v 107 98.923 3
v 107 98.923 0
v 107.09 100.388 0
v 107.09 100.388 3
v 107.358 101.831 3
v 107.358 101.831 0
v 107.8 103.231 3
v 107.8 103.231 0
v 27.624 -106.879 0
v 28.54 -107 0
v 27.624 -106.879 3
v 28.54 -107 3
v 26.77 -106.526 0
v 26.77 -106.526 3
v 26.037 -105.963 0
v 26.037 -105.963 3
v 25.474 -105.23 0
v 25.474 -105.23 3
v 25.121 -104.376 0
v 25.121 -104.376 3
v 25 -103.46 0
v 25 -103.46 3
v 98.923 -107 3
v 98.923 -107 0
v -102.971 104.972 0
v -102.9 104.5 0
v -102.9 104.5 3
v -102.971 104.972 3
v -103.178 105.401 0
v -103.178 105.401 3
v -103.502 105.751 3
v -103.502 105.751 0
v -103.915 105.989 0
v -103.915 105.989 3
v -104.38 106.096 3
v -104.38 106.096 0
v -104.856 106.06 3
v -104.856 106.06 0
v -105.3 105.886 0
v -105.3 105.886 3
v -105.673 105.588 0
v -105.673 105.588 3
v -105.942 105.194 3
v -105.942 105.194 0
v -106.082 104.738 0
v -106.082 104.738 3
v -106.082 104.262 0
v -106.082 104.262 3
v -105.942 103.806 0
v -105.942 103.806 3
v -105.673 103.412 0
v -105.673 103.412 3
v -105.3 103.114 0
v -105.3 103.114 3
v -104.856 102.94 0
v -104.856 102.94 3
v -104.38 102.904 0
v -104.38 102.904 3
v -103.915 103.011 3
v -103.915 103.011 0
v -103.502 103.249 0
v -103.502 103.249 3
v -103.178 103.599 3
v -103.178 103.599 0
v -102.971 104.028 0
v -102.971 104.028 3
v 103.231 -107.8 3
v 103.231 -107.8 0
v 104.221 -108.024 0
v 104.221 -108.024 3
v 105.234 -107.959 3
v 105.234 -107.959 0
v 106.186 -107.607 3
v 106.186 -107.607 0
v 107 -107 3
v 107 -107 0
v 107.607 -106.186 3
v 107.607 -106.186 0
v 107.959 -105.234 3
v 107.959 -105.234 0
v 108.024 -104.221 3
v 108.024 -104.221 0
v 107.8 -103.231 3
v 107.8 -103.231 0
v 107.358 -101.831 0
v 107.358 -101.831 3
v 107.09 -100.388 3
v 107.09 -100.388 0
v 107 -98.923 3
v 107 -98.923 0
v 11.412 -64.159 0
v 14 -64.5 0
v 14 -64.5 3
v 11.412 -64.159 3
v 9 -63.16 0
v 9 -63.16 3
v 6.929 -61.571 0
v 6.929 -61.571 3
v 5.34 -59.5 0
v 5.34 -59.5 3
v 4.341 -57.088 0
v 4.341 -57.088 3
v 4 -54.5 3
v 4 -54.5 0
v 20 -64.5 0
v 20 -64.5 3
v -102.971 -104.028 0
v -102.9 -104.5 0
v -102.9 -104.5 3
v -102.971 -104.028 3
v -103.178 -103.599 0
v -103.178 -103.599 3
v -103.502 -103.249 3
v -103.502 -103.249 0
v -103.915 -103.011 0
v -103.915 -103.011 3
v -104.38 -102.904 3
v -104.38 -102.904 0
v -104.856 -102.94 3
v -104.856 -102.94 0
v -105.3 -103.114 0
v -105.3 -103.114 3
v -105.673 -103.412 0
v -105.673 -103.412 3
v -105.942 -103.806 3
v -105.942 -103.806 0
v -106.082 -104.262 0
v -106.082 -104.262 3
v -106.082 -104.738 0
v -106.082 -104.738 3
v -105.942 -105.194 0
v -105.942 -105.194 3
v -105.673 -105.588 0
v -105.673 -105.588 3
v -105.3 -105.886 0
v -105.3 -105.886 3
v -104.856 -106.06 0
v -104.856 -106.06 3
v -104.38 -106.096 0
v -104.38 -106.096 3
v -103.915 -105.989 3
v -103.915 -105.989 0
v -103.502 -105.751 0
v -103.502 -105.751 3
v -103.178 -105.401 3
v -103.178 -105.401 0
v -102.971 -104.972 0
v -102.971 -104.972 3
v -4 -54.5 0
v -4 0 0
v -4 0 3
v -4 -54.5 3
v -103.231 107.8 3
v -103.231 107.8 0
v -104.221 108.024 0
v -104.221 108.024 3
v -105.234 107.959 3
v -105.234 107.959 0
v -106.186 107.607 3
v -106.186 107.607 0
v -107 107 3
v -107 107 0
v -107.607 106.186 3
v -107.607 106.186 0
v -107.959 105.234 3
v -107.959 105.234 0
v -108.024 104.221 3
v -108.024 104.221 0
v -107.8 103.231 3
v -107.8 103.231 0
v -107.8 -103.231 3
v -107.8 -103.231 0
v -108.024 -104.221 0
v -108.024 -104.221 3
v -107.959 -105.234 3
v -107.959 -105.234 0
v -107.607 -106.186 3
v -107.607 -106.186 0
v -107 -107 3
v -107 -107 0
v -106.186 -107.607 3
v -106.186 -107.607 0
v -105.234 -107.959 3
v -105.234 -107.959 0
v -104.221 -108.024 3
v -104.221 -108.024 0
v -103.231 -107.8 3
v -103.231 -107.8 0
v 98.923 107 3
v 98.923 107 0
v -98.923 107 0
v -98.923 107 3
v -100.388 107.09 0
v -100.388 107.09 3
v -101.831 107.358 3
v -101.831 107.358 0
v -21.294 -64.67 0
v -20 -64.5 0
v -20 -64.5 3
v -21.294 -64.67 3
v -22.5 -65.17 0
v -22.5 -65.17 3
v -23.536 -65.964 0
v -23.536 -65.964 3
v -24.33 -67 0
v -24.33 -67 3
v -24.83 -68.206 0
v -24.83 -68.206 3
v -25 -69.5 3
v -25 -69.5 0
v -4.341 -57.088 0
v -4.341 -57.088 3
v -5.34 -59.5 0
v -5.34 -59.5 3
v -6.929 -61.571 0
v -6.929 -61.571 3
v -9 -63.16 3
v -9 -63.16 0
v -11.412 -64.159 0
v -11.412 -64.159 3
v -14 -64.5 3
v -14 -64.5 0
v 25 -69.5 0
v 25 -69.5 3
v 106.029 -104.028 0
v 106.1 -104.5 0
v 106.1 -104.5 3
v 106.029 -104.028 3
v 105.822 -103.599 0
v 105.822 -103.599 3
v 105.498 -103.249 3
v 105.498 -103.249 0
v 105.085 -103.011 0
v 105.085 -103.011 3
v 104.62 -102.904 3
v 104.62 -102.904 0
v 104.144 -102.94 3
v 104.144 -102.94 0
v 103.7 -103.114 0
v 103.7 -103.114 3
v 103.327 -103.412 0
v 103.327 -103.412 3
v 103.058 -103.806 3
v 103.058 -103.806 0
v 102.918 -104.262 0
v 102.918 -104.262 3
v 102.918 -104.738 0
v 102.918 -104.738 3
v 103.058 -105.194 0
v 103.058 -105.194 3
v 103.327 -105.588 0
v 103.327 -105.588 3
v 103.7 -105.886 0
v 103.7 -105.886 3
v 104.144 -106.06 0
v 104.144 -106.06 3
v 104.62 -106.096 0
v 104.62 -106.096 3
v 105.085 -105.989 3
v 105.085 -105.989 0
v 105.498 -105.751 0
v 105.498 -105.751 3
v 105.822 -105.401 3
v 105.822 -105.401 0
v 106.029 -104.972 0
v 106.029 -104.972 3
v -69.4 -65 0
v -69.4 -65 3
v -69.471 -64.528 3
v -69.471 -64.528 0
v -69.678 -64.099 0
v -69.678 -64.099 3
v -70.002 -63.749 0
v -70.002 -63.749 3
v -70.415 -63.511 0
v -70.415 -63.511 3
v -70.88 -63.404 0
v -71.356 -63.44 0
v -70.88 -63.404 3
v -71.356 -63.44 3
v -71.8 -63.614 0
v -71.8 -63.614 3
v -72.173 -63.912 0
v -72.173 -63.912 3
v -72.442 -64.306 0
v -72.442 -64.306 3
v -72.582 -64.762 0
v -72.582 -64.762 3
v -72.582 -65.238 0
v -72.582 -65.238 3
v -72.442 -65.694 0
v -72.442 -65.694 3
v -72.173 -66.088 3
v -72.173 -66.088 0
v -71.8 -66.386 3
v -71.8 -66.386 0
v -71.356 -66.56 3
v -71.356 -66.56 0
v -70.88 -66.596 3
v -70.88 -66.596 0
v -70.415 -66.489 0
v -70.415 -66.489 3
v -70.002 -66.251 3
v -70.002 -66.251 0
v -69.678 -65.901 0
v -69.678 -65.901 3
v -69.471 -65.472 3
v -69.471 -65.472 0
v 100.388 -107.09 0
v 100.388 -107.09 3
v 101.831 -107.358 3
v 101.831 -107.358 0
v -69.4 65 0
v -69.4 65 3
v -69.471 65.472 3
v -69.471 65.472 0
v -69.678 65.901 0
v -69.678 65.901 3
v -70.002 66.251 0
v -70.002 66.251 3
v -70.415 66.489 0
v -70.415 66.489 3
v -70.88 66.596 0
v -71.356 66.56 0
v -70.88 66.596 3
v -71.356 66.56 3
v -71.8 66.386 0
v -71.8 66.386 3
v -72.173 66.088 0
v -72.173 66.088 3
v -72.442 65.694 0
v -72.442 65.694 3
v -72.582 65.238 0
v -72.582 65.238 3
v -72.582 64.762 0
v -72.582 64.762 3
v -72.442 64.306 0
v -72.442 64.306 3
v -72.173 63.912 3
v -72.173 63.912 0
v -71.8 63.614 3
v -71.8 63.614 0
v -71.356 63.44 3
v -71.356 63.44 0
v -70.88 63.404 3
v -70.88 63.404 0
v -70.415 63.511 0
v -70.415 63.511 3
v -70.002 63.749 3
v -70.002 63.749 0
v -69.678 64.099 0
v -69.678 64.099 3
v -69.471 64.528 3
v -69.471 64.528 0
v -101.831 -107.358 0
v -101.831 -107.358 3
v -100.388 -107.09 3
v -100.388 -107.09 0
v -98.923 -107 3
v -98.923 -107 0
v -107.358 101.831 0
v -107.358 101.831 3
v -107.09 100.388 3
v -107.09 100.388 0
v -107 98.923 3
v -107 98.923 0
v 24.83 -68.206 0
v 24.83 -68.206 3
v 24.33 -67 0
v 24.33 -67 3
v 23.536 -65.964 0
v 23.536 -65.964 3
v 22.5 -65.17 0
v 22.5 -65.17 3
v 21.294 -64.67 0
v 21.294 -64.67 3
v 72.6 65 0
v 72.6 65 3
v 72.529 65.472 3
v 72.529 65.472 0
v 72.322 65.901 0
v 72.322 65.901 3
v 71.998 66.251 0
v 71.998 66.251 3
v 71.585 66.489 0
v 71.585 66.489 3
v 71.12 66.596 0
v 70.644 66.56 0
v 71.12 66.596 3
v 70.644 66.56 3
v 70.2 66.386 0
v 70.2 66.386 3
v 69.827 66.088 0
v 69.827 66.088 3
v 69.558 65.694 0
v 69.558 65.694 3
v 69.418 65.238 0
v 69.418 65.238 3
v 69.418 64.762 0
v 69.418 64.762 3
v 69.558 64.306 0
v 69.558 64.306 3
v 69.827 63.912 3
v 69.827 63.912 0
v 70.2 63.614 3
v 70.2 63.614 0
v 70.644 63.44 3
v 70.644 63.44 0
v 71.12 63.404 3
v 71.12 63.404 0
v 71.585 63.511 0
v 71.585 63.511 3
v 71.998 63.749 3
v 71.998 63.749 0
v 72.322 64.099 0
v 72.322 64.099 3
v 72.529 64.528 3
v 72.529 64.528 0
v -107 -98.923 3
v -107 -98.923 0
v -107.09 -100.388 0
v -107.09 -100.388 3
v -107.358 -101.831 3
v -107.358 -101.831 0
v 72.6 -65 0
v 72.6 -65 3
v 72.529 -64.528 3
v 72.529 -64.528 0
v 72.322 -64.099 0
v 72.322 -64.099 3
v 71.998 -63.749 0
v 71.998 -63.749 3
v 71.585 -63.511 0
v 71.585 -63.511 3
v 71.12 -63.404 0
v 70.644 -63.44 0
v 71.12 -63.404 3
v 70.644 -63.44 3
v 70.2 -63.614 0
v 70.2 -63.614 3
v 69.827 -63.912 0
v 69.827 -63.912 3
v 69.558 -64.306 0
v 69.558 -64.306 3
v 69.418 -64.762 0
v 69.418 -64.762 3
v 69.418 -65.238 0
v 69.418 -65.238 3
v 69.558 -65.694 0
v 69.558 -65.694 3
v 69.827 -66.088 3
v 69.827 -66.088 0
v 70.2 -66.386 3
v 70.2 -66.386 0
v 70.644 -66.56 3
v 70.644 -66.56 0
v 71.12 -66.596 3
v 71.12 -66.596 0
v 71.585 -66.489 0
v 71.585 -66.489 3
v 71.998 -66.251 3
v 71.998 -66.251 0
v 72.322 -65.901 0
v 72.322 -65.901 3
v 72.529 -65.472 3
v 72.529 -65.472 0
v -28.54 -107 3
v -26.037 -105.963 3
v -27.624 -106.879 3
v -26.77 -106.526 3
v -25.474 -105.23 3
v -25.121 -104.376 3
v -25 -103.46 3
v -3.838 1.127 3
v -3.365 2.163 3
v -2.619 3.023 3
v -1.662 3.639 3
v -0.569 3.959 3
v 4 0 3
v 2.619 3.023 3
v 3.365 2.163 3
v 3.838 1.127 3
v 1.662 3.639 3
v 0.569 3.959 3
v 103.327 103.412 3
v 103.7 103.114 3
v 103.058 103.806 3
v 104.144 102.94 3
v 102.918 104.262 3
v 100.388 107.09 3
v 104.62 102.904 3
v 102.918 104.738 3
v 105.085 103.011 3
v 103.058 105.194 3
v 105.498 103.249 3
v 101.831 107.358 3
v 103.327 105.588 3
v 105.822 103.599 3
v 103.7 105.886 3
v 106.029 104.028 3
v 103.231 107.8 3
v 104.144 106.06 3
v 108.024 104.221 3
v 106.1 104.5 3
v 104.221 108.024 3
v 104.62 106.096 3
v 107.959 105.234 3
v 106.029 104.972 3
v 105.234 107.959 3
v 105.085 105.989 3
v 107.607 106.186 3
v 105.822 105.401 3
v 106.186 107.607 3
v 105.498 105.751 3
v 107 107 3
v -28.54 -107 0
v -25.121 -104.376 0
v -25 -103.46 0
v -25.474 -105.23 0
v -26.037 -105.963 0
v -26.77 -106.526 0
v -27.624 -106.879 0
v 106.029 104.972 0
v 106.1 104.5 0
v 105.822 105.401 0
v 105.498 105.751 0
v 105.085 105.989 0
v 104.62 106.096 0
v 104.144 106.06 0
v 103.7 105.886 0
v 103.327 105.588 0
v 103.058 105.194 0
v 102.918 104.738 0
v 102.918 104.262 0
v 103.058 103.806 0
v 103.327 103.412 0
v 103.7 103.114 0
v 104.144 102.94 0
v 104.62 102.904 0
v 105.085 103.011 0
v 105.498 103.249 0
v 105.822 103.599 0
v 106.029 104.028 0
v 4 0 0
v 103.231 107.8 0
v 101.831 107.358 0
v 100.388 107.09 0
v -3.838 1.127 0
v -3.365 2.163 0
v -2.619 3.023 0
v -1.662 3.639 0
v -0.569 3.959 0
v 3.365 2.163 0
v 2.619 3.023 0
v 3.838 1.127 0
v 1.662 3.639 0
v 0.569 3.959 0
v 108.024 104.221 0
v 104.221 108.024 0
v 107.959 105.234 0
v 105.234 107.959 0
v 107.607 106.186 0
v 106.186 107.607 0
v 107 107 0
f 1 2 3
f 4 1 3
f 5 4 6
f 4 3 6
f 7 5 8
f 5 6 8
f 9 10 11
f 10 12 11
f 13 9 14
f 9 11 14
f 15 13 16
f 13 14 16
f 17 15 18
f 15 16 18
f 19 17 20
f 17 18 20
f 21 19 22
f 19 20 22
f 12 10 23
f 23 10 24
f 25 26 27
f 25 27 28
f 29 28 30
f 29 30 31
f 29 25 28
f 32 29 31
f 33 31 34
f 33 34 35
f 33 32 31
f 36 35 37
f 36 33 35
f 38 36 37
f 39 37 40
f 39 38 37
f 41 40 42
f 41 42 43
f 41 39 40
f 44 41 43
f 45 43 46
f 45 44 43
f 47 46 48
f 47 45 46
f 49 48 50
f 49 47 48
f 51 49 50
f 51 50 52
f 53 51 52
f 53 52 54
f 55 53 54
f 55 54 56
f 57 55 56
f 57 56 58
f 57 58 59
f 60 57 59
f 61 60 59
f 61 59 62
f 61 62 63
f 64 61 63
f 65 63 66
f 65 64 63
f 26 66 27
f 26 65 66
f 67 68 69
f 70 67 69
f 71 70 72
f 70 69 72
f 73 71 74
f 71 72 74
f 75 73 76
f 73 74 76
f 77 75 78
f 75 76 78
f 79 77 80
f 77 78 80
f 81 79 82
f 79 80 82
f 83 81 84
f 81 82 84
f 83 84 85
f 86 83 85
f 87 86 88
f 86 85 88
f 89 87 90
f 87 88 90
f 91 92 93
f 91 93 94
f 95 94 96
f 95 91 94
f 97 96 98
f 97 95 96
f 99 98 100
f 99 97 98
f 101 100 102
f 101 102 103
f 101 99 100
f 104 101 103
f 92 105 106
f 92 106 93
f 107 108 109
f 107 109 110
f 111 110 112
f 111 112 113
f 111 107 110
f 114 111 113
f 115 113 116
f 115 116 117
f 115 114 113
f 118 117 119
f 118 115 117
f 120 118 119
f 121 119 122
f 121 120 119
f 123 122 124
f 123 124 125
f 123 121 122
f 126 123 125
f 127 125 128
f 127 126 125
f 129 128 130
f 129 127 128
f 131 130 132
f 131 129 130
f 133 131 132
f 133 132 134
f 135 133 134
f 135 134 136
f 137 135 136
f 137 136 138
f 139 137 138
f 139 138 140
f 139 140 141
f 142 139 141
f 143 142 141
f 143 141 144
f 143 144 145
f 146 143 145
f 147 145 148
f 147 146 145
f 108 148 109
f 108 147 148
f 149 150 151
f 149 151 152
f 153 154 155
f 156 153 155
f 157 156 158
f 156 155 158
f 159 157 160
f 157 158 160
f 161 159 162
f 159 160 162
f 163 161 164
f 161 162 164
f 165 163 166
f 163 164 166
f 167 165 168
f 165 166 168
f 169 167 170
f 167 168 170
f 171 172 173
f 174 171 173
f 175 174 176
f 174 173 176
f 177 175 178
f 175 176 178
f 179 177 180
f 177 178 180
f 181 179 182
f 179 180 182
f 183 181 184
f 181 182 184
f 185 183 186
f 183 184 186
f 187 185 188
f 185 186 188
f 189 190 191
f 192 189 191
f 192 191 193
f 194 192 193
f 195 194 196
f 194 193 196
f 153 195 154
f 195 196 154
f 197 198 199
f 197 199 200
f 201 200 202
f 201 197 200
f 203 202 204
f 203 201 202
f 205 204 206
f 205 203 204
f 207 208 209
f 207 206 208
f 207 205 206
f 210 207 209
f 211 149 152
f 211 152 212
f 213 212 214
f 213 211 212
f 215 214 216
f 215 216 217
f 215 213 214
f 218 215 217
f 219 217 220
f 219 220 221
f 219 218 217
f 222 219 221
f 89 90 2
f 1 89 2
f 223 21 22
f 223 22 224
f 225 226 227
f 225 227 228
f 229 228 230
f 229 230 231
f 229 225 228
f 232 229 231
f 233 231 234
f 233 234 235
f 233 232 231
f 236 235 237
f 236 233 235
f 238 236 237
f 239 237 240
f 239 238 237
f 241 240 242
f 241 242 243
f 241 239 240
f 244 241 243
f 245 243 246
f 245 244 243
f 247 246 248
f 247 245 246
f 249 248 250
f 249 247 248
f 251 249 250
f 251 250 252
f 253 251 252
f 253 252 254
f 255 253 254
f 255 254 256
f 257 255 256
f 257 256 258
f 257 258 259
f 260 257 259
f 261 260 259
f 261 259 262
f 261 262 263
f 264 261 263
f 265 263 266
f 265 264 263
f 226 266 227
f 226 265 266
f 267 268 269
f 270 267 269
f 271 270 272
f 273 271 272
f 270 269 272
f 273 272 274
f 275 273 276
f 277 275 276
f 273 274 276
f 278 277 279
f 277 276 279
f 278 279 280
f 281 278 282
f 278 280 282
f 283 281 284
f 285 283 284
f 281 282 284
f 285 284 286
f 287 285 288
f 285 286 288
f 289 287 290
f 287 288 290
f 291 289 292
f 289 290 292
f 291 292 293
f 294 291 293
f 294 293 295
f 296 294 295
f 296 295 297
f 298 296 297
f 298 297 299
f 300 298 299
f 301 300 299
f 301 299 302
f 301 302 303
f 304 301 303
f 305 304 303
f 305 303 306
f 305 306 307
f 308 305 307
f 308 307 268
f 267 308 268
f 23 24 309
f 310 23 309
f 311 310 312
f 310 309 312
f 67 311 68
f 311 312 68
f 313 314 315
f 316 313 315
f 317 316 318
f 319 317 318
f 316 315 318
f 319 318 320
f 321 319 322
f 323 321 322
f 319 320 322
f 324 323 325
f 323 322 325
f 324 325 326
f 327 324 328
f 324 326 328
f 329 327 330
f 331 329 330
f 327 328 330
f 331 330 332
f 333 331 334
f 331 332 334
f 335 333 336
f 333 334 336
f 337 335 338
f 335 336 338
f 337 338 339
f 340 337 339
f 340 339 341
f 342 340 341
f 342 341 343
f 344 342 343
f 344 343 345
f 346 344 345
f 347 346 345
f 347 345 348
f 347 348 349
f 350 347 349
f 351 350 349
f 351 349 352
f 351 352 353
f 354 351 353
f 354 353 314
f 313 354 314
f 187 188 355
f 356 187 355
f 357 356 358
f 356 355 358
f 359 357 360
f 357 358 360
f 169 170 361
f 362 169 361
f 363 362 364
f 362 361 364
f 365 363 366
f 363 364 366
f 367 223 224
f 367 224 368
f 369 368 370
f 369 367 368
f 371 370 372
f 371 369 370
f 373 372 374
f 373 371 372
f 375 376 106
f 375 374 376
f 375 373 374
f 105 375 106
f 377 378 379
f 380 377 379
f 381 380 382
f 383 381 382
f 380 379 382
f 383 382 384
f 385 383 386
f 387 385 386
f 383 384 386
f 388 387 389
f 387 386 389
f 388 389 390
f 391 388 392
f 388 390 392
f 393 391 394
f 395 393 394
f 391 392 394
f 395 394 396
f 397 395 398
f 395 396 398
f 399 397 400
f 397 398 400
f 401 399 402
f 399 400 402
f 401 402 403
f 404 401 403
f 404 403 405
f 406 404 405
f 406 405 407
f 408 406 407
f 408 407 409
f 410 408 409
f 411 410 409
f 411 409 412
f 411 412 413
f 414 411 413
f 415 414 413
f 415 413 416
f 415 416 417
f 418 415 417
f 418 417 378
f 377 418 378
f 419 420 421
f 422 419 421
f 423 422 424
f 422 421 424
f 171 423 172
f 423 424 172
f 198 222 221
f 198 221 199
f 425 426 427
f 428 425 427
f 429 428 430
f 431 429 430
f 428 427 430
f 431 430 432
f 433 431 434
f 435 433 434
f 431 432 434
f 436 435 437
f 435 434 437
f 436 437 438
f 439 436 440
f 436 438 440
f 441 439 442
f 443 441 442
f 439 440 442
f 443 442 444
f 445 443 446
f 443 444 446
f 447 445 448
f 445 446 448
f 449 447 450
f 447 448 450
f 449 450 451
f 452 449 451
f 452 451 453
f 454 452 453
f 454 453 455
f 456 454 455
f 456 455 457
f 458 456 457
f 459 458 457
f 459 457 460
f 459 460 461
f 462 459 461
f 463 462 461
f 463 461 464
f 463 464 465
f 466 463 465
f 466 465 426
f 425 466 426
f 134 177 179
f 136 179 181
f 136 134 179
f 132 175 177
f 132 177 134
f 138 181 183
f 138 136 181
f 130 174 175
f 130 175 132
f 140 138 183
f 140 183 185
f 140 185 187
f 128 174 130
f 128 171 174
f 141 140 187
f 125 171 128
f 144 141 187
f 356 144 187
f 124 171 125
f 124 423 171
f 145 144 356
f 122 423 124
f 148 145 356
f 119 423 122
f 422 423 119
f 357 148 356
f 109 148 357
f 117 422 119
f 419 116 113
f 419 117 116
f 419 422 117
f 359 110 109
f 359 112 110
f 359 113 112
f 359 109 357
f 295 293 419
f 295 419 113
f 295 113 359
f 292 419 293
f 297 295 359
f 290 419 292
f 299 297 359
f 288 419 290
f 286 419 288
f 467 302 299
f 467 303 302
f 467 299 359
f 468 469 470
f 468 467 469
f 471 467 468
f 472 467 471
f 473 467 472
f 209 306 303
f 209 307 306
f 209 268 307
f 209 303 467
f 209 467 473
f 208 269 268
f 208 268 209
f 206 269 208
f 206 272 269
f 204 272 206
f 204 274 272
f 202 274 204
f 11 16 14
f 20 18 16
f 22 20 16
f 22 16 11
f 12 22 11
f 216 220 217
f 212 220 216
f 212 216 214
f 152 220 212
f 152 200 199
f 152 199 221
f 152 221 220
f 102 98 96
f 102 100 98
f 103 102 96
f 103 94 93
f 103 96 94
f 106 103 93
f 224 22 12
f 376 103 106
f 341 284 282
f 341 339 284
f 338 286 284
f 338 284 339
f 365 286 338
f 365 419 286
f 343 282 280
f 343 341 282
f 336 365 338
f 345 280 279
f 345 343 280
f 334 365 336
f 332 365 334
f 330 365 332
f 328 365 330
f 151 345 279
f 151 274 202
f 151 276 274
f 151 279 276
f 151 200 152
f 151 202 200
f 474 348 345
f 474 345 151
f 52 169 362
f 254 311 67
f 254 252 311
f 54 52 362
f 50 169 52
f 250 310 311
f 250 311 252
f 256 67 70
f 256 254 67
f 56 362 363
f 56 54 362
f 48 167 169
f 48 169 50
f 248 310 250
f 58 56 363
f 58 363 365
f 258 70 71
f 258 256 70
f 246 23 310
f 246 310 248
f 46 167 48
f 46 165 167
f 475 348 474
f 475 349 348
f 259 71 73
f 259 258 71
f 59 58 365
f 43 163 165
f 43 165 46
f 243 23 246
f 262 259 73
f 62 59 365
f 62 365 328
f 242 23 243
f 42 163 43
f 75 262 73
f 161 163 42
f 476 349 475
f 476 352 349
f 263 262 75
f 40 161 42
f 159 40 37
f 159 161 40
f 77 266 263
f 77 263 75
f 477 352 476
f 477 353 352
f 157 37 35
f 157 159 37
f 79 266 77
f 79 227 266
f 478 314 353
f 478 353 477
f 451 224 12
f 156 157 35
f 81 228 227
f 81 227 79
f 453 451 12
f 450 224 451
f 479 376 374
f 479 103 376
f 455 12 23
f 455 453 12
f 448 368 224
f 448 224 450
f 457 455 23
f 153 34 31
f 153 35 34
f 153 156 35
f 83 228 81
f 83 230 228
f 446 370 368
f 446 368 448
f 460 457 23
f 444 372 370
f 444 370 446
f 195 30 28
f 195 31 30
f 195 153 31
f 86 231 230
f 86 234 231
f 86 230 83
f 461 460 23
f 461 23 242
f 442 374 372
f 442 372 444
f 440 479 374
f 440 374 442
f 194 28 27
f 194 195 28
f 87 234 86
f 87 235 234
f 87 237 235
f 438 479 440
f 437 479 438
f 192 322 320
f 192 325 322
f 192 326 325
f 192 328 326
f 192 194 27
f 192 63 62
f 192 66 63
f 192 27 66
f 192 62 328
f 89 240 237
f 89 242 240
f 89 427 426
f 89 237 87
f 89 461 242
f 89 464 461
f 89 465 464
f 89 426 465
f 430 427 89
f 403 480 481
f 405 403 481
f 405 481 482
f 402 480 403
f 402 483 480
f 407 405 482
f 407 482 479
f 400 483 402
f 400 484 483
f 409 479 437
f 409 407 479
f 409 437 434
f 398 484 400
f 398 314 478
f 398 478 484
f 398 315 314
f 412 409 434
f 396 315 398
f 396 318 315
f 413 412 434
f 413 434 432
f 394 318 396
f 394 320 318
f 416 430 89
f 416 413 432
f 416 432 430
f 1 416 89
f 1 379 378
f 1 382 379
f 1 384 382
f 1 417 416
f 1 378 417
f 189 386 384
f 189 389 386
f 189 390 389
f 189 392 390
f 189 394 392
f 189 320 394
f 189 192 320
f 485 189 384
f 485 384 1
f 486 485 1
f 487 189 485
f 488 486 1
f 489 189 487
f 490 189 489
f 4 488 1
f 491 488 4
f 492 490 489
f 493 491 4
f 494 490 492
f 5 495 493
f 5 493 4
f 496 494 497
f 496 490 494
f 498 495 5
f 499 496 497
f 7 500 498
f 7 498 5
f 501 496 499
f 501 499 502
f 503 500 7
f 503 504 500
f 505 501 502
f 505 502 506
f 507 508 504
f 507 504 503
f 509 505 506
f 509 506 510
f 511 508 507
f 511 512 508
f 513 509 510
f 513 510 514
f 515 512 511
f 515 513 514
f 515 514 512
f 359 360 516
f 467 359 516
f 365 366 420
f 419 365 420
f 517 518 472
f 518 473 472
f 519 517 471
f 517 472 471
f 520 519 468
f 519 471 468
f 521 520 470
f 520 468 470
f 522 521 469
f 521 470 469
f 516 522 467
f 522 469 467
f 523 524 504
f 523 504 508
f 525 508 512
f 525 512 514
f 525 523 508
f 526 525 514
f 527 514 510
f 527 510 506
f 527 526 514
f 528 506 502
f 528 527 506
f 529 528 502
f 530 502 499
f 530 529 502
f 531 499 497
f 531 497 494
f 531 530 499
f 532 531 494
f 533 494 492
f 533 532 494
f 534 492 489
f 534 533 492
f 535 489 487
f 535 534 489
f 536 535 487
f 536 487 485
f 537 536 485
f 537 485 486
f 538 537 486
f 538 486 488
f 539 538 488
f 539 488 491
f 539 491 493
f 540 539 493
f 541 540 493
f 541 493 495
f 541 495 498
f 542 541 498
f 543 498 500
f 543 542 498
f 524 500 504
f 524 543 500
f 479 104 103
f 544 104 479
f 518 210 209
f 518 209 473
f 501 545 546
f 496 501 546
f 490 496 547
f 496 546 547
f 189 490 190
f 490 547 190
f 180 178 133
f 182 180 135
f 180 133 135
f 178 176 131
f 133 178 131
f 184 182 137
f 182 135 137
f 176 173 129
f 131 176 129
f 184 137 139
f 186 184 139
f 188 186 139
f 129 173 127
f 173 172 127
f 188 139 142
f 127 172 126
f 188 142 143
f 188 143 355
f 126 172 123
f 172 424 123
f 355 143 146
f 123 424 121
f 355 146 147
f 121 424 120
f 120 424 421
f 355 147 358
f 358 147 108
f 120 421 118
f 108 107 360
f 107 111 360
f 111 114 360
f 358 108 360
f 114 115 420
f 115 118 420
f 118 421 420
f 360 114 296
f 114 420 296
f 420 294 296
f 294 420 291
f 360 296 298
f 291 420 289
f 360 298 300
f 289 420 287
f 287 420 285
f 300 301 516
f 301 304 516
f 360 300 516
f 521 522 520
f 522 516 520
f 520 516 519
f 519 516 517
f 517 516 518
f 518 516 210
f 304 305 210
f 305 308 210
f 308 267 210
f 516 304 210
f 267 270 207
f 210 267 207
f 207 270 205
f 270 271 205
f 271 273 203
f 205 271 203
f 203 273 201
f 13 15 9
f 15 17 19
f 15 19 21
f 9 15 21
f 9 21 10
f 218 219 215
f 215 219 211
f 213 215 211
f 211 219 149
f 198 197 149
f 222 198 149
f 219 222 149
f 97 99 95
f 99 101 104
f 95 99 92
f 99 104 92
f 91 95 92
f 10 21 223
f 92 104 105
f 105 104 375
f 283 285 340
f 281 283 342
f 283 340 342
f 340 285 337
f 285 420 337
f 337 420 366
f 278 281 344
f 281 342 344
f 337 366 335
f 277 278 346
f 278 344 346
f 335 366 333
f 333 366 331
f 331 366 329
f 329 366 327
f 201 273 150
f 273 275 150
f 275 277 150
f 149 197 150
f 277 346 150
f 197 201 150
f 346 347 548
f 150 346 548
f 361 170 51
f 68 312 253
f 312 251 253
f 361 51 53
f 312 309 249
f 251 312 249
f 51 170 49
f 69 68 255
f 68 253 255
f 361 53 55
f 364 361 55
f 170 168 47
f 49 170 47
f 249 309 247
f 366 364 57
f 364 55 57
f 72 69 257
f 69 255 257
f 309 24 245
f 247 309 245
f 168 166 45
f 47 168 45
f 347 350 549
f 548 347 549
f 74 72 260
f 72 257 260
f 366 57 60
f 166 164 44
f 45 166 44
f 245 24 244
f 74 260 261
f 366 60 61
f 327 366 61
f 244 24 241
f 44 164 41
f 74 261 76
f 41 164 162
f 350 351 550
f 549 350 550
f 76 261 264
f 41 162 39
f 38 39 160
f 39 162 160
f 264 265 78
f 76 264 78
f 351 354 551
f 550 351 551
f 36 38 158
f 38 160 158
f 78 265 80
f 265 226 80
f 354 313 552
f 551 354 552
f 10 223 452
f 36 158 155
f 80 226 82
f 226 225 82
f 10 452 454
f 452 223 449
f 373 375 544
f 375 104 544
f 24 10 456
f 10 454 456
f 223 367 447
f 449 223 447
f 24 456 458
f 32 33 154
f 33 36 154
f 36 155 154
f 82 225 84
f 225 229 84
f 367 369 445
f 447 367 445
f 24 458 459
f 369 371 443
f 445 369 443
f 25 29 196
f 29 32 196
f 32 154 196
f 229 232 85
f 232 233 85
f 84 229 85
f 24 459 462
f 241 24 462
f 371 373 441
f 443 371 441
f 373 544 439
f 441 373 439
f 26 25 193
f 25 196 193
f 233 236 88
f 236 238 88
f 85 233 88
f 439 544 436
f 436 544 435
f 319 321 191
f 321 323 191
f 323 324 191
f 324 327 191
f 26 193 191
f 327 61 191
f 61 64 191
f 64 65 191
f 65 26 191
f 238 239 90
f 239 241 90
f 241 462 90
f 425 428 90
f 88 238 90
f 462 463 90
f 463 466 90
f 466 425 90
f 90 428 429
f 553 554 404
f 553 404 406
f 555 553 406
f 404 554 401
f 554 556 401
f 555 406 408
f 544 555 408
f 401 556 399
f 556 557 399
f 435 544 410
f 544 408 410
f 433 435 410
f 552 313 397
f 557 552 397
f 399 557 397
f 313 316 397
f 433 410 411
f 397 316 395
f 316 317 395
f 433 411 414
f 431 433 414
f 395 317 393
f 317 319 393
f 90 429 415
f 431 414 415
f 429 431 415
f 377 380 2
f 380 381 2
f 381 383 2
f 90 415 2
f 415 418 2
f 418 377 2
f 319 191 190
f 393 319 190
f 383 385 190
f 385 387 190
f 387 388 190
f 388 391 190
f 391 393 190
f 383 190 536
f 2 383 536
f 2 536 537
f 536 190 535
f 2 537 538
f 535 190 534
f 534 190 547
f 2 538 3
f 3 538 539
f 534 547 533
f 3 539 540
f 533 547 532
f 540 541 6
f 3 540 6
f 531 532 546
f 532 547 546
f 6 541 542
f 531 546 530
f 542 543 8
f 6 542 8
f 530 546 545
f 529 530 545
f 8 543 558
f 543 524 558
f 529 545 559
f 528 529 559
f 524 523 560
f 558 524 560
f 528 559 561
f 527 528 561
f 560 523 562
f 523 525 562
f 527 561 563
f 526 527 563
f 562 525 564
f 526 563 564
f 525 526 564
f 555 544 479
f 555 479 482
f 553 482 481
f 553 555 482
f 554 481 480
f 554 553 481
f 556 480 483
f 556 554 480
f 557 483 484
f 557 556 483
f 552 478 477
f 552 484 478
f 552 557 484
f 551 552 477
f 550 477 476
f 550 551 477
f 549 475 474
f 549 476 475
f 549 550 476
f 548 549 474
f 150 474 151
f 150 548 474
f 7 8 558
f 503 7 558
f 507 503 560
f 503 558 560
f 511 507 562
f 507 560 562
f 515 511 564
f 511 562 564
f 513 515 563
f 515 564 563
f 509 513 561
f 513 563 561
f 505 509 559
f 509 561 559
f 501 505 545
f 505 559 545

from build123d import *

# Parameters (mm, degrees)
SKETCH1_R           = 1.6
BOSS_EXTRUDE1_DEPTH = 3
SKETCH3_R           = 1.6
CUT_EXTRUDE2_DEPTH  = 4
CUT_EXTRUDE5_DEPTH  = 4
FILLET1_R           = 3.54


with BuildPart() as part:
    # Sketch1 → Boss-Extrude1 (new body)
    with BuildSketch(Plane.XY):
        with BuildLine():
            Line((-107, 98.923010333), (-107, -98.923010333))
            ThreePointArc((-107, -98.923010333), (-107.201661971, -101.11372249), (-107.799869959, -103.230804092))
            ThreePointArc((-107.799869959, -103.230804092), (-107, -107), (-103.230804092, -107.799869959))
            ThreePointArc((-103.230804092, -107.799869959), (-101.11372249, -107.201661971), (-98.923010333, -107))
            Line((-98.923010333, -107), (-43, -107))
            Line((-43, -107), (43, -107))
            Line((43, -107), (98.923010333, -107))
            ThreePointArc((98.923010333, -107), (101.11372249, -107.201661971), (103.230804092, -107.799869959))
            ThreePointArc((103.230804092, -107.799869959), (107, -107), (107.799869959, -103.230804092))
            ThreePointArc((107.799869959, -103.230804092), (107.201661971, -101.11372249), (107, -98.923010333))
            Line((107, -98.923010333), (107, 98.923010333))
            ThreePointArc((107, 98.923010333), (107.201661971, 101.11372249), (107.799869959, 103.230804092))
            ThreePointArc((107.799869959, 103.230804092), (107, 107), (103.230804092, 107.799869959))
            ThreePointArc((103.230804092, 107.799869959), (101.11372249, 107.201661971), (98.923010333, 107))
            Line((98.923010333, 107), (-98.923010333, 107))
            ThreePointArc((-98.923010333, 107), (-101.11372249, 107.201661971), (-103.230804092, 107.799869959))
            ThreePointArc((-103.230804092, 107.799869959), (-107, 107), (-107.799869959, 103.230804092))
            ThreePointArc((-107.799869959, 103.230804092), (-107.201661971, 101.11372249), (-107, 98.923010333))
        make_face()
        with Locations((-104.5, -104.5)):
            Circle(SKETCH1_R, mode=Mode.SUBTRACT)
        with Locations((-104.5, 104.5)):
            Circle(SKETCH1_R, mode=Mode.SUBTRACT)
        with Locations((104.5, 104.5)):
            Circle(SKETCH1_R, mode=Mode.SUBTRACT)
        with Locations((104.5, -104.5)):
            Circle(SKETCH1_R, mode=Mode.SUBTRACT)
    extrude(amount=BOSS_EXTRUDE1_DEPTH)

    # Sketch3 → Cut-Extrude2 (cut, through all)
    with BuildSketch(Plane.XY.offset(3)):
        with Locations((-71, 65)):
            Circle(SKETCH3_R)
        with Locations((71, 65)):
            Circle(SKETCH3_R)
        with Locations((71, -65)):
            Circle(SKETCH3_R)
        with Locations((-71, -65)):
            Circle(SKETCH3_R)
    extrude(amount=-CUT_EXTRUDE2_DEPTH, mode=Mode.SUBTRACT)

    # Sketch5 → Cut-Extrude5 (cut, through all)
    with BuildSketch(Plane.XY):
        with BuildLine():
            Line((-25, -107), (25, -107))
            Line((25, -107), (25, -69.5))
            ThreePointArc((25, -69.5), (23.535533906, -65.964466094), (20, -64.5))
            Line((20, -64.5), (14, -64.5))
            ThreePointArc((14, -64.5), (6.928932188, -61.571067812), (4, -54.5))
            Line((4, -54.5), (4, 0))
            ThreePointArc((4, 0), (0, 4), (-4, 0))
            Line((-4, 0), (-4, -54.5))
            ThreePointArc((-4, -54.5), (-6.928932188, -61.571067812), (-14, -64.5))
            Line((-14, -64.5), (-20, -64.5))
            ThreePointArc((-20, -64.5), (-23.535533906, -65.964466094), (-25, -69.5))
            Line((-25, -69.5), (-25, -107))
        make_face()
    extrude(amount=CUT_EXTRUDE5_DEPTH, mode=Mode.SUBTRACT)

    # Fillet1
    fillet1_edges = [part.edges().sort_by_distance(p)[0] for p in [
        (-25, -107, 1.5),
        (25, -107, 1.5),
    ]]
    fillet(fillet1_edges, radius=FILLET1_R)


solid = part.part
